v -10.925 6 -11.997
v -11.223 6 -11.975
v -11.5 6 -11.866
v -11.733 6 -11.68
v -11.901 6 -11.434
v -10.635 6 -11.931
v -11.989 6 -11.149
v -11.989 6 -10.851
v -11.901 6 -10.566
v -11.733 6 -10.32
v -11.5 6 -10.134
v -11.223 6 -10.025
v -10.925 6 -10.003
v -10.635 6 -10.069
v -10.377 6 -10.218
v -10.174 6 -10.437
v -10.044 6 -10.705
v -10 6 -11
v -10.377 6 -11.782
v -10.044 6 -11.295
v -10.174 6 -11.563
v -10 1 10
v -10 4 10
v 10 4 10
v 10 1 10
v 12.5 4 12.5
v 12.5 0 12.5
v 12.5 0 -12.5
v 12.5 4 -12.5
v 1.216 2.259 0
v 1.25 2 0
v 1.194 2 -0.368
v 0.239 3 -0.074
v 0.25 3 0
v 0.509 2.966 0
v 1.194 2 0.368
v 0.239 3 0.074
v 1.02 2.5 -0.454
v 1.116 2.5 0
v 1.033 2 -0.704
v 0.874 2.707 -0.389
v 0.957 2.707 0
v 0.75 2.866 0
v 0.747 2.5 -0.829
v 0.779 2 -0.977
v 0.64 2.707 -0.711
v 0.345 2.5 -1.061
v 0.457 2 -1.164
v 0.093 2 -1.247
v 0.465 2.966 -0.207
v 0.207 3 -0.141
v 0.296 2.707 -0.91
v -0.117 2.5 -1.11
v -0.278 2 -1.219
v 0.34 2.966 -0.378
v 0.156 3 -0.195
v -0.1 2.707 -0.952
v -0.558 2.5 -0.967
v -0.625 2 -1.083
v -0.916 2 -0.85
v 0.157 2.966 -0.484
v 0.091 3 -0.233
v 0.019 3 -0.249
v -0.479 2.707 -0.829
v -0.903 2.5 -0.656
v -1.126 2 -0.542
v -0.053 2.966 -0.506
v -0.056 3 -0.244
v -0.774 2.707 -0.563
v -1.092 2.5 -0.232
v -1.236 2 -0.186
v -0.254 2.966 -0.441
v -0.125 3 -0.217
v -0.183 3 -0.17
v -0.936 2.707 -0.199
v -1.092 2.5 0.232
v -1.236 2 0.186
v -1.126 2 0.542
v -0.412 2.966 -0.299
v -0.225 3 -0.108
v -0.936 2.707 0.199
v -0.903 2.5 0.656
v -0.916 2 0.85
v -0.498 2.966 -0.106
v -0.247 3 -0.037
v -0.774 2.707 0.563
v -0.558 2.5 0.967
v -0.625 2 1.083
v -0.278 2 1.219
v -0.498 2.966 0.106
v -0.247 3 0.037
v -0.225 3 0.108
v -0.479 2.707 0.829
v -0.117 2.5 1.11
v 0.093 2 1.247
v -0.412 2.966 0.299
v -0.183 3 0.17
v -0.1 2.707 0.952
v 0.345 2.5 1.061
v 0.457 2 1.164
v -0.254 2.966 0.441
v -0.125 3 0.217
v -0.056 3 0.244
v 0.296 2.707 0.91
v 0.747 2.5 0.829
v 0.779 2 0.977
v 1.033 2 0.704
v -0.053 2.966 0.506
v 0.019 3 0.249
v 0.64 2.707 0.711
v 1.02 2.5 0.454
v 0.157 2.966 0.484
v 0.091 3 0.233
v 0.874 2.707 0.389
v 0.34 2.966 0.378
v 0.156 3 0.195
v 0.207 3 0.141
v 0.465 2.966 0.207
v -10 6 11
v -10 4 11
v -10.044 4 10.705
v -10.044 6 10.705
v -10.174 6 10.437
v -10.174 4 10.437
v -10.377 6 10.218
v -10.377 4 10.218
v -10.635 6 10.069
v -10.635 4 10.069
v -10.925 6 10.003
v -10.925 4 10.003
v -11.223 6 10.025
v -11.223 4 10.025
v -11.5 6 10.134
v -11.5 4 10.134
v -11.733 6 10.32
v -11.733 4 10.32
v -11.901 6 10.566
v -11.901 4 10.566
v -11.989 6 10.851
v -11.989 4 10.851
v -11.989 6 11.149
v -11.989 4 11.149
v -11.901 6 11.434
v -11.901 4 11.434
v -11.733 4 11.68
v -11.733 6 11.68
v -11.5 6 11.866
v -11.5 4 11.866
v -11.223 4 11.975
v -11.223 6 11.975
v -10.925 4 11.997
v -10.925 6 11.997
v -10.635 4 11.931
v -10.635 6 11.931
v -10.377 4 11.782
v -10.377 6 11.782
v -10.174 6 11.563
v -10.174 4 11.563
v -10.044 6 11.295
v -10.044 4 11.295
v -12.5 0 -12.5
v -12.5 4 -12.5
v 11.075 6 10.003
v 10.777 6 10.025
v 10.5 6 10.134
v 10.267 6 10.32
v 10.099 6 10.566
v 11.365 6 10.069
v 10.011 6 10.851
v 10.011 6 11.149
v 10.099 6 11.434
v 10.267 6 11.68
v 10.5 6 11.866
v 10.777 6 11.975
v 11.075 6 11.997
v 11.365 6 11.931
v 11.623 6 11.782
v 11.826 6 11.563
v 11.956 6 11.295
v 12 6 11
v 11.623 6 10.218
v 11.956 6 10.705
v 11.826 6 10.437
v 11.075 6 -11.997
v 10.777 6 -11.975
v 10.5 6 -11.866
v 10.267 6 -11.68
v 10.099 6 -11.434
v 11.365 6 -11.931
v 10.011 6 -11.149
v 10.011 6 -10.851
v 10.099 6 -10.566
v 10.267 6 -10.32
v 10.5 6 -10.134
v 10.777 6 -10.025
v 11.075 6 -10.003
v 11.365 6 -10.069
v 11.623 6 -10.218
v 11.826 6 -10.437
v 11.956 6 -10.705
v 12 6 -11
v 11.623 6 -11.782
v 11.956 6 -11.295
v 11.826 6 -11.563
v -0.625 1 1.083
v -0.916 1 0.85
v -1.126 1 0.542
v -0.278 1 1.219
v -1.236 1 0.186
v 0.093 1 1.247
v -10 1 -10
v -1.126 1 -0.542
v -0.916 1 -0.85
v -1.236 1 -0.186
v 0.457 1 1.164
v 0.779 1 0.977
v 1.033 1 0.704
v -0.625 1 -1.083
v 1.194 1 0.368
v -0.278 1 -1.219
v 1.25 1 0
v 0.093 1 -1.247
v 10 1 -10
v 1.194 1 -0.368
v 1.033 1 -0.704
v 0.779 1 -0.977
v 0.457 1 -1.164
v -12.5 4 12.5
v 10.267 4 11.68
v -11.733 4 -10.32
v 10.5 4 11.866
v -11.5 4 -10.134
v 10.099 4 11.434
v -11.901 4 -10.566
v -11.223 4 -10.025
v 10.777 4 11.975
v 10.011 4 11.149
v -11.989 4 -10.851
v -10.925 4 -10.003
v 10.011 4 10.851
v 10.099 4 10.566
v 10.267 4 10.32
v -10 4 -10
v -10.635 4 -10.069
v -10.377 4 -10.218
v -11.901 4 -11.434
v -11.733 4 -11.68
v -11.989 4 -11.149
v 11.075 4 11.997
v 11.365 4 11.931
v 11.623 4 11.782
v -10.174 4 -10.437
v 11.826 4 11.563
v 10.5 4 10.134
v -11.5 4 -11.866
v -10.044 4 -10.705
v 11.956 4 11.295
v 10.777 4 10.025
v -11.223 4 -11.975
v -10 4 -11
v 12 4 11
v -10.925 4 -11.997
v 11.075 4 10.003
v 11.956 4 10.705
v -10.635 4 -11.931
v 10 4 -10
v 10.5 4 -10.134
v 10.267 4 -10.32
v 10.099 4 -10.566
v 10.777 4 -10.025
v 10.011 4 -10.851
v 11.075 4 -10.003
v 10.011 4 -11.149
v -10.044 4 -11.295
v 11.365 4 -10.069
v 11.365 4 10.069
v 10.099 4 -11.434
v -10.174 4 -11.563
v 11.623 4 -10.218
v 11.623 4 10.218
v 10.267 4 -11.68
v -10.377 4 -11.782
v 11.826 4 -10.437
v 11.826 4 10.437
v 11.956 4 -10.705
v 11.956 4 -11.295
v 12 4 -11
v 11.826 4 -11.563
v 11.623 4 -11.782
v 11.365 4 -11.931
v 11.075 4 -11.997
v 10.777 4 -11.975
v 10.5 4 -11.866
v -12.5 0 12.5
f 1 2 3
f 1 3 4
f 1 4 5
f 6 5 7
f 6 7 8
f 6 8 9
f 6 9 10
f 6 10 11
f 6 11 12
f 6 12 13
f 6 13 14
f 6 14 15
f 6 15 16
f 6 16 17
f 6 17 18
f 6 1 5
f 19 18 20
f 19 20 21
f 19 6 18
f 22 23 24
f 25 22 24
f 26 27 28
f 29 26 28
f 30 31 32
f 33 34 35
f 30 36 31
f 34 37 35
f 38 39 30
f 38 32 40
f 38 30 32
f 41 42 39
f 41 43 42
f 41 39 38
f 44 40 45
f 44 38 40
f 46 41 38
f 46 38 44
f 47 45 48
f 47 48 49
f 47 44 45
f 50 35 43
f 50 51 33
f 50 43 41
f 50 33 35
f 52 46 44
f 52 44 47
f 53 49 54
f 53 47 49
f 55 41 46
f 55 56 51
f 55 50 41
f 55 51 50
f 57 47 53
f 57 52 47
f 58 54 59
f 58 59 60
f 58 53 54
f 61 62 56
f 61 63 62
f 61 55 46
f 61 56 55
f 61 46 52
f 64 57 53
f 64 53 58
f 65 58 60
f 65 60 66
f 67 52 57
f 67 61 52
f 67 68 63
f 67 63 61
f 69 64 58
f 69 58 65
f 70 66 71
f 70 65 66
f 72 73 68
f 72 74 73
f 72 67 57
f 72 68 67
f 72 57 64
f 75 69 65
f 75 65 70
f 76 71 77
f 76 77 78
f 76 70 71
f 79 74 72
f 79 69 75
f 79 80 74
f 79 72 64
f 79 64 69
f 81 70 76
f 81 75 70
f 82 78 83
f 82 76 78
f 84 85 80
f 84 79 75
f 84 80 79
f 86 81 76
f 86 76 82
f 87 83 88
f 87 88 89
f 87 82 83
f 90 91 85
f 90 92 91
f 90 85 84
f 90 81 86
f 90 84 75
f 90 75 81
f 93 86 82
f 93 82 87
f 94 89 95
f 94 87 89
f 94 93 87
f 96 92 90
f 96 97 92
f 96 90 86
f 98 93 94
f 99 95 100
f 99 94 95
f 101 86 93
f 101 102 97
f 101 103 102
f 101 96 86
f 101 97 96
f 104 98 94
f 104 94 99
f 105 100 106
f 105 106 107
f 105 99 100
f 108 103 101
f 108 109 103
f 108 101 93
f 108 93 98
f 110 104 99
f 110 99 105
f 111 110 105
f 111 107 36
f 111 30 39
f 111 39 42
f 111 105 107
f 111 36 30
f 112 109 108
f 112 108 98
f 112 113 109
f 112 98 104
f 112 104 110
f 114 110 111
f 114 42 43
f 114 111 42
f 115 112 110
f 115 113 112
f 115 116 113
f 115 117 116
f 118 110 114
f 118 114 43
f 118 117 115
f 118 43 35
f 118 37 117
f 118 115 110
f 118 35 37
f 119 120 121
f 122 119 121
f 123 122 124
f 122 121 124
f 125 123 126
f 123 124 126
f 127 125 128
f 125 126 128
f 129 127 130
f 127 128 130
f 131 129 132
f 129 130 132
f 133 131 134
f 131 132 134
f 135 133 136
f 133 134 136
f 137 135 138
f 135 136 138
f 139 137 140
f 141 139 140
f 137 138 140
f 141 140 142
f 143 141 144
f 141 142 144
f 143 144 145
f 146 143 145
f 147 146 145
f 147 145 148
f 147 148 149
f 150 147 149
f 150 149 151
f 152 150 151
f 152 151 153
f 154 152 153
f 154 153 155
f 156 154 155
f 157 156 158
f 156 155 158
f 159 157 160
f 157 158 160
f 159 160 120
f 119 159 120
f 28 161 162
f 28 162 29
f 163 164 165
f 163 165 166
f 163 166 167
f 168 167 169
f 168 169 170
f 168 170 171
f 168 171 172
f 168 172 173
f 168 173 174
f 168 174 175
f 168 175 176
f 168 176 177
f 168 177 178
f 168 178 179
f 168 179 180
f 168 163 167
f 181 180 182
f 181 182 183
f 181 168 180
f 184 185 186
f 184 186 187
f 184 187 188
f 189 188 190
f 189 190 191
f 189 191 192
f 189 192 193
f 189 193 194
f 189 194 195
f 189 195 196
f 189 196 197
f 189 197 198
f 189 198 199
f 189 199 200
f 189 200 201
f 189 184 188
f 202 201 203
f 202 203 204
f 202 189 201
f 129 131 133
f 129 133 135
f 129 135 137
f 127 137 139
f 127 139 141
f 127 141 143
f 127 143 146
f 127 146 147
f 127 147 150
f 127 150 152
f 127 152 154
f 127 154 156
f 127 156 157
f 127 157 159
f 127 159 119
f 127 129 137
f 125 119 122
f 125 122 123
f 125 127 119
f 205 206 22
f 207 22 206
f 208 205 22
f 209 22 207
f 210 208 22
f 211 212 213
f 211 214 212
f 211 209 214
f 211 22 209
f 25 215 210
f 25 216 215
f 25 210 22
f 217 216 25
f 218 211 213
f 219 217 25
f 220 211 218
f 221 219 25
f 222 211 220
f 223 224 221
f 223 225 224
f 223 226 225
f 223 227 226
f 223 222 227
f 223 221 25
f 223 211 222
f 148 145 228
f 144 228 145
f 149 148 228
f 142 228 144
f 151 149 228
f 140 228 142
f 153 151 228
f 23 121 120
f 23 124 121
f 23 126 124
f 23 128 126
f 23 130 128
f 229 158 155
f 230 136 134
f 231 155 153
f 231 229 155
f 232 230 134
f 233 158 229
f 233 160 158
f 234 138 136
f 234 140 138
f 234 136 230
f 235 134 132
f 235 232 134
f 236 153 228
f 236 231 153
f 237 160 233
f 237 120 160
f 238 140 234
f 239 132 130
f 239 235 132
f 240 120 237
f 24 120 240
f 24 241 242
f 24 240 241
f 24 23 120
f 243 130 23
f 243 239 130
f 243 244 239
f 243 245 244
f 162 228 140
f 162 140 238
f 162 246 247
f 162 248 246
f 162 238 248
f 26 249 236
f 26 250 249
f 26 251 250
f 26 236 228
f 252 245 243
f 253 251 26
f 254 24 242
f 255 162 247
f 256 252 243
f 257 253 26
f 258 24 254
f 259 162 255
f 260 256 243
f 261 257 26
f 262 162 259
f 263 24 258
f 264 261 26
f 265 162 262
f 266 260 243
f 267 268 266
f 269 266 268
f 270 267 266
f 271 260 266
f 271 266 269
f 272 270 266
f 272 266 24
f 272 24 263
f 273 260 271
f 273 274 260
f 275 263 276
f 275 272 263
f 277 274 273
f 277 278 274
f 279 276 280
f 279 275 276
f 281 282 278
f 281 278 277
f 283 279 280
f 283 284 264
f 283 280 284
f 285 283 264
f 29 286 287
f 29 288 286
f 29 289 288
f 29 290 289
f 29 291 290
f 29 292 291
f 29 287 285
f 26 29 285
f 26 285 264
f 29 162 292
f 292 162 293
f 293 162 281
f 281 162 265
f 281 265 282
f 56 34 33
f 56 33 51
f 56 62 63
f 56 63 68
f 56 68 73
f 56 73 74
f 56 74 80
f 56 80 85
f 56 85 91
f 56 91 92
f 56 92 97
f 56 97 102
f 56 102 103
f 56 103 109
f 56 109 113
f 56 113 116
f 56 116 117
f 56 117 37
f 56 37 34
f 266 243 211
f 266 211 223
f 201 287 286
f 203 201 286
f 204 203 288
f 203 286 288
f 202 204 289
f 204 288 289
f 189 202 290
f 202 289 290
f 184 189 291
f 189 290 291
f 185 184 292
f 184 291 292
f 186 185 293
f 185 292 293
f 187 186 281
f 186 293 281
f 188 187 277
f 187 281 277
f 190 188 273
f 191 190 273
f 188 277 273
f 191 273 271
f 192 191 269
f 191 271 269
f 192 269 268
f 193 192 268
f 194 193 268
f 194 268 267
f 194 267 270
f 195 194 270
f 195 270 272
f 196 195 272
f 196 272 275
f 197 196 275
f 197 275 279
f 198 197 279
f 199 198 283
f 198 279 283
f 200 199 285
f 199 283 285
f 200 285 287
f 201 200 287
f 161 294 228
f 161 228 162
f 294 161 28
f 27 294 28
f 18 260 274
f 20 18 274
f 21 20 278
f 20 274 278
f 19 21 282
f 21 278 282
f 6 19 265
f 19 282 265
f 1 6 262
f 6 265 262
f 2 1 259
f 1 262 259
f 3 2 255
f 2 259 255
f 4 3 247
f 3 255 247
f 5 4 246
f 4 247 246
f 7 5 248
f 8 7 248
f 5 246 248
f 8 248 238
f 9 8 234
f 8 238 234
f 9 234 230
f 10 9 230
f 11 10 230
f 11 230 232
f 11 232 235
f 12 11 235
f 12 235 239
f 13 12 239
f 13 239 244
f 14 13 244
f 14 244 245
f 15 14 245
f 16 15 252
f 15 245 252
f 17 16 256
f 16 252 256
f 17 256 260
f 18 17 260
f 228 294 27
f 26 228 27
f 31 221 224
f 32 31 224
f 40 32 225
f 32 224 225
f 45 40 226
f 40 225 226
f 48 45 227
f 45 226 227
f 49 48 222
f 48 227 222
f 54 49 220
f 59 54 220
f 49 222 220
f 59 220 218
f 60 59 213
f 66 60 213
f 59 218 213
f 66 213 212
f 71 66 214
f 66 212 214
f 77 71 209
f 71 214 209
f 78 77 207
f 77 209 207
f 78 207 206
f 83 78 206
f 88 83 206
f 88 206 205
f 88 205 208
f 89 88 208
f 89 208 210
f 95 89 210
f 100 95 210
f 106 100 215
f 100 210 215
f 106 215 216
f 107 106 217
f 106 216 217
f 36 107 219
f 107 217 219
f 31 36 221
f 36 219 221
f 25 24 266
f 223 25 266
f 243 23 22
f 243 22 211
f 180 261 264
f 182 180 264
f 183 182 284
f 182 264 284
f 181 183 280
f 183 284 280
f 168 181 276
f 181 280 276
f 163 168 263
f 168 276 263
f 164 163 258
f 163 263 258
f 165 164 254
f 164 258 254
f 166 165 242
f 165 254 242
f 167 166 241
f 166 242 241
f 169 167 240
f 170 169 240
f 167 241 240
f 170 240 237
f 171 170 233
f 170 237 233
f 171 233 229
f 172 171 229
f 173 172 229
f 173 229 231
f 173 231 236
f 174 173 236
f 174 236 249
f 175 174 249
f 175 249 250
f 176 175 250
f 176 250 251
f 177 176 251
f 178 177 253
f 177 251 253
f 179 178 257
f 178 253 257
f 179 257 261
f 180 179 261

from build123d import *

# Parameters (mm, degrees)
SKETCH1_W           = 25
SKETCH1_H           = 25
BOSS_EXTRUDE1_DEPTH = 4
SKETCH2_W           = 20
SKETCH2_H           = 20
CUT_EXTRUDE1_DEPTH  = 3
SKETCH3_R           = 1.25
BOSS_EXTRUDE2_DEPTH = 2
FILLET1_R           = 1
SKETCH4_R           = 1
BOSS_EXTRUDE3_DEPTH = 2


with BuildPart() as part:
    # Sketch1 → Boss-Extrude1 (new body)
    with BuildSketch(Plane(origin=(0, 0, 0), x_dir=(1, 0, 0), z_dir=(0, 1, 0))):
        Rectangle(SKETCH1_W, SKETCH1_H)
    extrude(amount=BOSS_EXTRUDE1_DEPTH)

    # Sketch2 → Cut-Extrude1 (cut)
    with BuildSketch(Plane(origin=(0, 4, 0), x_dir=(1, 0, 0), z_dir=(0, 1, 0))):
        Rectangle(SKETCH2_W, SKETCH2_H)
    extrude(amount=-CUT_EXTRUDE1_DEPTH, mode=Mode.SUBTRACT)

    # Sketch3 → Boss-Extrude2 (add)
    with BuildSketch(Plane(origin=(0, 1, 0), x_dir=(1, 0, 0), z_dir=(0, 1, 0))):
        Circle(SKETCH3_R)
    extrude(amount=BOSS_EXTRUDE2_DEPTH)

    # Fillet1
    fillet1_edges = [part.edges().sort_by_distance(p)[0] for p in [
        (-1.25, 3, 0),
    ]]
    fillet(fillet1_edges, radius=FILLET1_R)

    # Sketch4 → Boss-Extrude3 (add)
    with BuildSketch(Plane(origin=(0, 4, 0), x_dir=(1, 0, 0), z_dir=(0, 1, 0))):
        with Locations((-11, 11)):
            Circle(SKETCH4_R)
        with Locations((11, 11)):
            Circle(SKETCH4_R)
        with Locations((11, -11)):
            Circle(SKETCH4_R)
        with Locations((-11, -11)):
            Circle(SKETCH4_R)
    extrude(amount=BOSS_EXTRUDE3_DEPTH)


solid = part.part
